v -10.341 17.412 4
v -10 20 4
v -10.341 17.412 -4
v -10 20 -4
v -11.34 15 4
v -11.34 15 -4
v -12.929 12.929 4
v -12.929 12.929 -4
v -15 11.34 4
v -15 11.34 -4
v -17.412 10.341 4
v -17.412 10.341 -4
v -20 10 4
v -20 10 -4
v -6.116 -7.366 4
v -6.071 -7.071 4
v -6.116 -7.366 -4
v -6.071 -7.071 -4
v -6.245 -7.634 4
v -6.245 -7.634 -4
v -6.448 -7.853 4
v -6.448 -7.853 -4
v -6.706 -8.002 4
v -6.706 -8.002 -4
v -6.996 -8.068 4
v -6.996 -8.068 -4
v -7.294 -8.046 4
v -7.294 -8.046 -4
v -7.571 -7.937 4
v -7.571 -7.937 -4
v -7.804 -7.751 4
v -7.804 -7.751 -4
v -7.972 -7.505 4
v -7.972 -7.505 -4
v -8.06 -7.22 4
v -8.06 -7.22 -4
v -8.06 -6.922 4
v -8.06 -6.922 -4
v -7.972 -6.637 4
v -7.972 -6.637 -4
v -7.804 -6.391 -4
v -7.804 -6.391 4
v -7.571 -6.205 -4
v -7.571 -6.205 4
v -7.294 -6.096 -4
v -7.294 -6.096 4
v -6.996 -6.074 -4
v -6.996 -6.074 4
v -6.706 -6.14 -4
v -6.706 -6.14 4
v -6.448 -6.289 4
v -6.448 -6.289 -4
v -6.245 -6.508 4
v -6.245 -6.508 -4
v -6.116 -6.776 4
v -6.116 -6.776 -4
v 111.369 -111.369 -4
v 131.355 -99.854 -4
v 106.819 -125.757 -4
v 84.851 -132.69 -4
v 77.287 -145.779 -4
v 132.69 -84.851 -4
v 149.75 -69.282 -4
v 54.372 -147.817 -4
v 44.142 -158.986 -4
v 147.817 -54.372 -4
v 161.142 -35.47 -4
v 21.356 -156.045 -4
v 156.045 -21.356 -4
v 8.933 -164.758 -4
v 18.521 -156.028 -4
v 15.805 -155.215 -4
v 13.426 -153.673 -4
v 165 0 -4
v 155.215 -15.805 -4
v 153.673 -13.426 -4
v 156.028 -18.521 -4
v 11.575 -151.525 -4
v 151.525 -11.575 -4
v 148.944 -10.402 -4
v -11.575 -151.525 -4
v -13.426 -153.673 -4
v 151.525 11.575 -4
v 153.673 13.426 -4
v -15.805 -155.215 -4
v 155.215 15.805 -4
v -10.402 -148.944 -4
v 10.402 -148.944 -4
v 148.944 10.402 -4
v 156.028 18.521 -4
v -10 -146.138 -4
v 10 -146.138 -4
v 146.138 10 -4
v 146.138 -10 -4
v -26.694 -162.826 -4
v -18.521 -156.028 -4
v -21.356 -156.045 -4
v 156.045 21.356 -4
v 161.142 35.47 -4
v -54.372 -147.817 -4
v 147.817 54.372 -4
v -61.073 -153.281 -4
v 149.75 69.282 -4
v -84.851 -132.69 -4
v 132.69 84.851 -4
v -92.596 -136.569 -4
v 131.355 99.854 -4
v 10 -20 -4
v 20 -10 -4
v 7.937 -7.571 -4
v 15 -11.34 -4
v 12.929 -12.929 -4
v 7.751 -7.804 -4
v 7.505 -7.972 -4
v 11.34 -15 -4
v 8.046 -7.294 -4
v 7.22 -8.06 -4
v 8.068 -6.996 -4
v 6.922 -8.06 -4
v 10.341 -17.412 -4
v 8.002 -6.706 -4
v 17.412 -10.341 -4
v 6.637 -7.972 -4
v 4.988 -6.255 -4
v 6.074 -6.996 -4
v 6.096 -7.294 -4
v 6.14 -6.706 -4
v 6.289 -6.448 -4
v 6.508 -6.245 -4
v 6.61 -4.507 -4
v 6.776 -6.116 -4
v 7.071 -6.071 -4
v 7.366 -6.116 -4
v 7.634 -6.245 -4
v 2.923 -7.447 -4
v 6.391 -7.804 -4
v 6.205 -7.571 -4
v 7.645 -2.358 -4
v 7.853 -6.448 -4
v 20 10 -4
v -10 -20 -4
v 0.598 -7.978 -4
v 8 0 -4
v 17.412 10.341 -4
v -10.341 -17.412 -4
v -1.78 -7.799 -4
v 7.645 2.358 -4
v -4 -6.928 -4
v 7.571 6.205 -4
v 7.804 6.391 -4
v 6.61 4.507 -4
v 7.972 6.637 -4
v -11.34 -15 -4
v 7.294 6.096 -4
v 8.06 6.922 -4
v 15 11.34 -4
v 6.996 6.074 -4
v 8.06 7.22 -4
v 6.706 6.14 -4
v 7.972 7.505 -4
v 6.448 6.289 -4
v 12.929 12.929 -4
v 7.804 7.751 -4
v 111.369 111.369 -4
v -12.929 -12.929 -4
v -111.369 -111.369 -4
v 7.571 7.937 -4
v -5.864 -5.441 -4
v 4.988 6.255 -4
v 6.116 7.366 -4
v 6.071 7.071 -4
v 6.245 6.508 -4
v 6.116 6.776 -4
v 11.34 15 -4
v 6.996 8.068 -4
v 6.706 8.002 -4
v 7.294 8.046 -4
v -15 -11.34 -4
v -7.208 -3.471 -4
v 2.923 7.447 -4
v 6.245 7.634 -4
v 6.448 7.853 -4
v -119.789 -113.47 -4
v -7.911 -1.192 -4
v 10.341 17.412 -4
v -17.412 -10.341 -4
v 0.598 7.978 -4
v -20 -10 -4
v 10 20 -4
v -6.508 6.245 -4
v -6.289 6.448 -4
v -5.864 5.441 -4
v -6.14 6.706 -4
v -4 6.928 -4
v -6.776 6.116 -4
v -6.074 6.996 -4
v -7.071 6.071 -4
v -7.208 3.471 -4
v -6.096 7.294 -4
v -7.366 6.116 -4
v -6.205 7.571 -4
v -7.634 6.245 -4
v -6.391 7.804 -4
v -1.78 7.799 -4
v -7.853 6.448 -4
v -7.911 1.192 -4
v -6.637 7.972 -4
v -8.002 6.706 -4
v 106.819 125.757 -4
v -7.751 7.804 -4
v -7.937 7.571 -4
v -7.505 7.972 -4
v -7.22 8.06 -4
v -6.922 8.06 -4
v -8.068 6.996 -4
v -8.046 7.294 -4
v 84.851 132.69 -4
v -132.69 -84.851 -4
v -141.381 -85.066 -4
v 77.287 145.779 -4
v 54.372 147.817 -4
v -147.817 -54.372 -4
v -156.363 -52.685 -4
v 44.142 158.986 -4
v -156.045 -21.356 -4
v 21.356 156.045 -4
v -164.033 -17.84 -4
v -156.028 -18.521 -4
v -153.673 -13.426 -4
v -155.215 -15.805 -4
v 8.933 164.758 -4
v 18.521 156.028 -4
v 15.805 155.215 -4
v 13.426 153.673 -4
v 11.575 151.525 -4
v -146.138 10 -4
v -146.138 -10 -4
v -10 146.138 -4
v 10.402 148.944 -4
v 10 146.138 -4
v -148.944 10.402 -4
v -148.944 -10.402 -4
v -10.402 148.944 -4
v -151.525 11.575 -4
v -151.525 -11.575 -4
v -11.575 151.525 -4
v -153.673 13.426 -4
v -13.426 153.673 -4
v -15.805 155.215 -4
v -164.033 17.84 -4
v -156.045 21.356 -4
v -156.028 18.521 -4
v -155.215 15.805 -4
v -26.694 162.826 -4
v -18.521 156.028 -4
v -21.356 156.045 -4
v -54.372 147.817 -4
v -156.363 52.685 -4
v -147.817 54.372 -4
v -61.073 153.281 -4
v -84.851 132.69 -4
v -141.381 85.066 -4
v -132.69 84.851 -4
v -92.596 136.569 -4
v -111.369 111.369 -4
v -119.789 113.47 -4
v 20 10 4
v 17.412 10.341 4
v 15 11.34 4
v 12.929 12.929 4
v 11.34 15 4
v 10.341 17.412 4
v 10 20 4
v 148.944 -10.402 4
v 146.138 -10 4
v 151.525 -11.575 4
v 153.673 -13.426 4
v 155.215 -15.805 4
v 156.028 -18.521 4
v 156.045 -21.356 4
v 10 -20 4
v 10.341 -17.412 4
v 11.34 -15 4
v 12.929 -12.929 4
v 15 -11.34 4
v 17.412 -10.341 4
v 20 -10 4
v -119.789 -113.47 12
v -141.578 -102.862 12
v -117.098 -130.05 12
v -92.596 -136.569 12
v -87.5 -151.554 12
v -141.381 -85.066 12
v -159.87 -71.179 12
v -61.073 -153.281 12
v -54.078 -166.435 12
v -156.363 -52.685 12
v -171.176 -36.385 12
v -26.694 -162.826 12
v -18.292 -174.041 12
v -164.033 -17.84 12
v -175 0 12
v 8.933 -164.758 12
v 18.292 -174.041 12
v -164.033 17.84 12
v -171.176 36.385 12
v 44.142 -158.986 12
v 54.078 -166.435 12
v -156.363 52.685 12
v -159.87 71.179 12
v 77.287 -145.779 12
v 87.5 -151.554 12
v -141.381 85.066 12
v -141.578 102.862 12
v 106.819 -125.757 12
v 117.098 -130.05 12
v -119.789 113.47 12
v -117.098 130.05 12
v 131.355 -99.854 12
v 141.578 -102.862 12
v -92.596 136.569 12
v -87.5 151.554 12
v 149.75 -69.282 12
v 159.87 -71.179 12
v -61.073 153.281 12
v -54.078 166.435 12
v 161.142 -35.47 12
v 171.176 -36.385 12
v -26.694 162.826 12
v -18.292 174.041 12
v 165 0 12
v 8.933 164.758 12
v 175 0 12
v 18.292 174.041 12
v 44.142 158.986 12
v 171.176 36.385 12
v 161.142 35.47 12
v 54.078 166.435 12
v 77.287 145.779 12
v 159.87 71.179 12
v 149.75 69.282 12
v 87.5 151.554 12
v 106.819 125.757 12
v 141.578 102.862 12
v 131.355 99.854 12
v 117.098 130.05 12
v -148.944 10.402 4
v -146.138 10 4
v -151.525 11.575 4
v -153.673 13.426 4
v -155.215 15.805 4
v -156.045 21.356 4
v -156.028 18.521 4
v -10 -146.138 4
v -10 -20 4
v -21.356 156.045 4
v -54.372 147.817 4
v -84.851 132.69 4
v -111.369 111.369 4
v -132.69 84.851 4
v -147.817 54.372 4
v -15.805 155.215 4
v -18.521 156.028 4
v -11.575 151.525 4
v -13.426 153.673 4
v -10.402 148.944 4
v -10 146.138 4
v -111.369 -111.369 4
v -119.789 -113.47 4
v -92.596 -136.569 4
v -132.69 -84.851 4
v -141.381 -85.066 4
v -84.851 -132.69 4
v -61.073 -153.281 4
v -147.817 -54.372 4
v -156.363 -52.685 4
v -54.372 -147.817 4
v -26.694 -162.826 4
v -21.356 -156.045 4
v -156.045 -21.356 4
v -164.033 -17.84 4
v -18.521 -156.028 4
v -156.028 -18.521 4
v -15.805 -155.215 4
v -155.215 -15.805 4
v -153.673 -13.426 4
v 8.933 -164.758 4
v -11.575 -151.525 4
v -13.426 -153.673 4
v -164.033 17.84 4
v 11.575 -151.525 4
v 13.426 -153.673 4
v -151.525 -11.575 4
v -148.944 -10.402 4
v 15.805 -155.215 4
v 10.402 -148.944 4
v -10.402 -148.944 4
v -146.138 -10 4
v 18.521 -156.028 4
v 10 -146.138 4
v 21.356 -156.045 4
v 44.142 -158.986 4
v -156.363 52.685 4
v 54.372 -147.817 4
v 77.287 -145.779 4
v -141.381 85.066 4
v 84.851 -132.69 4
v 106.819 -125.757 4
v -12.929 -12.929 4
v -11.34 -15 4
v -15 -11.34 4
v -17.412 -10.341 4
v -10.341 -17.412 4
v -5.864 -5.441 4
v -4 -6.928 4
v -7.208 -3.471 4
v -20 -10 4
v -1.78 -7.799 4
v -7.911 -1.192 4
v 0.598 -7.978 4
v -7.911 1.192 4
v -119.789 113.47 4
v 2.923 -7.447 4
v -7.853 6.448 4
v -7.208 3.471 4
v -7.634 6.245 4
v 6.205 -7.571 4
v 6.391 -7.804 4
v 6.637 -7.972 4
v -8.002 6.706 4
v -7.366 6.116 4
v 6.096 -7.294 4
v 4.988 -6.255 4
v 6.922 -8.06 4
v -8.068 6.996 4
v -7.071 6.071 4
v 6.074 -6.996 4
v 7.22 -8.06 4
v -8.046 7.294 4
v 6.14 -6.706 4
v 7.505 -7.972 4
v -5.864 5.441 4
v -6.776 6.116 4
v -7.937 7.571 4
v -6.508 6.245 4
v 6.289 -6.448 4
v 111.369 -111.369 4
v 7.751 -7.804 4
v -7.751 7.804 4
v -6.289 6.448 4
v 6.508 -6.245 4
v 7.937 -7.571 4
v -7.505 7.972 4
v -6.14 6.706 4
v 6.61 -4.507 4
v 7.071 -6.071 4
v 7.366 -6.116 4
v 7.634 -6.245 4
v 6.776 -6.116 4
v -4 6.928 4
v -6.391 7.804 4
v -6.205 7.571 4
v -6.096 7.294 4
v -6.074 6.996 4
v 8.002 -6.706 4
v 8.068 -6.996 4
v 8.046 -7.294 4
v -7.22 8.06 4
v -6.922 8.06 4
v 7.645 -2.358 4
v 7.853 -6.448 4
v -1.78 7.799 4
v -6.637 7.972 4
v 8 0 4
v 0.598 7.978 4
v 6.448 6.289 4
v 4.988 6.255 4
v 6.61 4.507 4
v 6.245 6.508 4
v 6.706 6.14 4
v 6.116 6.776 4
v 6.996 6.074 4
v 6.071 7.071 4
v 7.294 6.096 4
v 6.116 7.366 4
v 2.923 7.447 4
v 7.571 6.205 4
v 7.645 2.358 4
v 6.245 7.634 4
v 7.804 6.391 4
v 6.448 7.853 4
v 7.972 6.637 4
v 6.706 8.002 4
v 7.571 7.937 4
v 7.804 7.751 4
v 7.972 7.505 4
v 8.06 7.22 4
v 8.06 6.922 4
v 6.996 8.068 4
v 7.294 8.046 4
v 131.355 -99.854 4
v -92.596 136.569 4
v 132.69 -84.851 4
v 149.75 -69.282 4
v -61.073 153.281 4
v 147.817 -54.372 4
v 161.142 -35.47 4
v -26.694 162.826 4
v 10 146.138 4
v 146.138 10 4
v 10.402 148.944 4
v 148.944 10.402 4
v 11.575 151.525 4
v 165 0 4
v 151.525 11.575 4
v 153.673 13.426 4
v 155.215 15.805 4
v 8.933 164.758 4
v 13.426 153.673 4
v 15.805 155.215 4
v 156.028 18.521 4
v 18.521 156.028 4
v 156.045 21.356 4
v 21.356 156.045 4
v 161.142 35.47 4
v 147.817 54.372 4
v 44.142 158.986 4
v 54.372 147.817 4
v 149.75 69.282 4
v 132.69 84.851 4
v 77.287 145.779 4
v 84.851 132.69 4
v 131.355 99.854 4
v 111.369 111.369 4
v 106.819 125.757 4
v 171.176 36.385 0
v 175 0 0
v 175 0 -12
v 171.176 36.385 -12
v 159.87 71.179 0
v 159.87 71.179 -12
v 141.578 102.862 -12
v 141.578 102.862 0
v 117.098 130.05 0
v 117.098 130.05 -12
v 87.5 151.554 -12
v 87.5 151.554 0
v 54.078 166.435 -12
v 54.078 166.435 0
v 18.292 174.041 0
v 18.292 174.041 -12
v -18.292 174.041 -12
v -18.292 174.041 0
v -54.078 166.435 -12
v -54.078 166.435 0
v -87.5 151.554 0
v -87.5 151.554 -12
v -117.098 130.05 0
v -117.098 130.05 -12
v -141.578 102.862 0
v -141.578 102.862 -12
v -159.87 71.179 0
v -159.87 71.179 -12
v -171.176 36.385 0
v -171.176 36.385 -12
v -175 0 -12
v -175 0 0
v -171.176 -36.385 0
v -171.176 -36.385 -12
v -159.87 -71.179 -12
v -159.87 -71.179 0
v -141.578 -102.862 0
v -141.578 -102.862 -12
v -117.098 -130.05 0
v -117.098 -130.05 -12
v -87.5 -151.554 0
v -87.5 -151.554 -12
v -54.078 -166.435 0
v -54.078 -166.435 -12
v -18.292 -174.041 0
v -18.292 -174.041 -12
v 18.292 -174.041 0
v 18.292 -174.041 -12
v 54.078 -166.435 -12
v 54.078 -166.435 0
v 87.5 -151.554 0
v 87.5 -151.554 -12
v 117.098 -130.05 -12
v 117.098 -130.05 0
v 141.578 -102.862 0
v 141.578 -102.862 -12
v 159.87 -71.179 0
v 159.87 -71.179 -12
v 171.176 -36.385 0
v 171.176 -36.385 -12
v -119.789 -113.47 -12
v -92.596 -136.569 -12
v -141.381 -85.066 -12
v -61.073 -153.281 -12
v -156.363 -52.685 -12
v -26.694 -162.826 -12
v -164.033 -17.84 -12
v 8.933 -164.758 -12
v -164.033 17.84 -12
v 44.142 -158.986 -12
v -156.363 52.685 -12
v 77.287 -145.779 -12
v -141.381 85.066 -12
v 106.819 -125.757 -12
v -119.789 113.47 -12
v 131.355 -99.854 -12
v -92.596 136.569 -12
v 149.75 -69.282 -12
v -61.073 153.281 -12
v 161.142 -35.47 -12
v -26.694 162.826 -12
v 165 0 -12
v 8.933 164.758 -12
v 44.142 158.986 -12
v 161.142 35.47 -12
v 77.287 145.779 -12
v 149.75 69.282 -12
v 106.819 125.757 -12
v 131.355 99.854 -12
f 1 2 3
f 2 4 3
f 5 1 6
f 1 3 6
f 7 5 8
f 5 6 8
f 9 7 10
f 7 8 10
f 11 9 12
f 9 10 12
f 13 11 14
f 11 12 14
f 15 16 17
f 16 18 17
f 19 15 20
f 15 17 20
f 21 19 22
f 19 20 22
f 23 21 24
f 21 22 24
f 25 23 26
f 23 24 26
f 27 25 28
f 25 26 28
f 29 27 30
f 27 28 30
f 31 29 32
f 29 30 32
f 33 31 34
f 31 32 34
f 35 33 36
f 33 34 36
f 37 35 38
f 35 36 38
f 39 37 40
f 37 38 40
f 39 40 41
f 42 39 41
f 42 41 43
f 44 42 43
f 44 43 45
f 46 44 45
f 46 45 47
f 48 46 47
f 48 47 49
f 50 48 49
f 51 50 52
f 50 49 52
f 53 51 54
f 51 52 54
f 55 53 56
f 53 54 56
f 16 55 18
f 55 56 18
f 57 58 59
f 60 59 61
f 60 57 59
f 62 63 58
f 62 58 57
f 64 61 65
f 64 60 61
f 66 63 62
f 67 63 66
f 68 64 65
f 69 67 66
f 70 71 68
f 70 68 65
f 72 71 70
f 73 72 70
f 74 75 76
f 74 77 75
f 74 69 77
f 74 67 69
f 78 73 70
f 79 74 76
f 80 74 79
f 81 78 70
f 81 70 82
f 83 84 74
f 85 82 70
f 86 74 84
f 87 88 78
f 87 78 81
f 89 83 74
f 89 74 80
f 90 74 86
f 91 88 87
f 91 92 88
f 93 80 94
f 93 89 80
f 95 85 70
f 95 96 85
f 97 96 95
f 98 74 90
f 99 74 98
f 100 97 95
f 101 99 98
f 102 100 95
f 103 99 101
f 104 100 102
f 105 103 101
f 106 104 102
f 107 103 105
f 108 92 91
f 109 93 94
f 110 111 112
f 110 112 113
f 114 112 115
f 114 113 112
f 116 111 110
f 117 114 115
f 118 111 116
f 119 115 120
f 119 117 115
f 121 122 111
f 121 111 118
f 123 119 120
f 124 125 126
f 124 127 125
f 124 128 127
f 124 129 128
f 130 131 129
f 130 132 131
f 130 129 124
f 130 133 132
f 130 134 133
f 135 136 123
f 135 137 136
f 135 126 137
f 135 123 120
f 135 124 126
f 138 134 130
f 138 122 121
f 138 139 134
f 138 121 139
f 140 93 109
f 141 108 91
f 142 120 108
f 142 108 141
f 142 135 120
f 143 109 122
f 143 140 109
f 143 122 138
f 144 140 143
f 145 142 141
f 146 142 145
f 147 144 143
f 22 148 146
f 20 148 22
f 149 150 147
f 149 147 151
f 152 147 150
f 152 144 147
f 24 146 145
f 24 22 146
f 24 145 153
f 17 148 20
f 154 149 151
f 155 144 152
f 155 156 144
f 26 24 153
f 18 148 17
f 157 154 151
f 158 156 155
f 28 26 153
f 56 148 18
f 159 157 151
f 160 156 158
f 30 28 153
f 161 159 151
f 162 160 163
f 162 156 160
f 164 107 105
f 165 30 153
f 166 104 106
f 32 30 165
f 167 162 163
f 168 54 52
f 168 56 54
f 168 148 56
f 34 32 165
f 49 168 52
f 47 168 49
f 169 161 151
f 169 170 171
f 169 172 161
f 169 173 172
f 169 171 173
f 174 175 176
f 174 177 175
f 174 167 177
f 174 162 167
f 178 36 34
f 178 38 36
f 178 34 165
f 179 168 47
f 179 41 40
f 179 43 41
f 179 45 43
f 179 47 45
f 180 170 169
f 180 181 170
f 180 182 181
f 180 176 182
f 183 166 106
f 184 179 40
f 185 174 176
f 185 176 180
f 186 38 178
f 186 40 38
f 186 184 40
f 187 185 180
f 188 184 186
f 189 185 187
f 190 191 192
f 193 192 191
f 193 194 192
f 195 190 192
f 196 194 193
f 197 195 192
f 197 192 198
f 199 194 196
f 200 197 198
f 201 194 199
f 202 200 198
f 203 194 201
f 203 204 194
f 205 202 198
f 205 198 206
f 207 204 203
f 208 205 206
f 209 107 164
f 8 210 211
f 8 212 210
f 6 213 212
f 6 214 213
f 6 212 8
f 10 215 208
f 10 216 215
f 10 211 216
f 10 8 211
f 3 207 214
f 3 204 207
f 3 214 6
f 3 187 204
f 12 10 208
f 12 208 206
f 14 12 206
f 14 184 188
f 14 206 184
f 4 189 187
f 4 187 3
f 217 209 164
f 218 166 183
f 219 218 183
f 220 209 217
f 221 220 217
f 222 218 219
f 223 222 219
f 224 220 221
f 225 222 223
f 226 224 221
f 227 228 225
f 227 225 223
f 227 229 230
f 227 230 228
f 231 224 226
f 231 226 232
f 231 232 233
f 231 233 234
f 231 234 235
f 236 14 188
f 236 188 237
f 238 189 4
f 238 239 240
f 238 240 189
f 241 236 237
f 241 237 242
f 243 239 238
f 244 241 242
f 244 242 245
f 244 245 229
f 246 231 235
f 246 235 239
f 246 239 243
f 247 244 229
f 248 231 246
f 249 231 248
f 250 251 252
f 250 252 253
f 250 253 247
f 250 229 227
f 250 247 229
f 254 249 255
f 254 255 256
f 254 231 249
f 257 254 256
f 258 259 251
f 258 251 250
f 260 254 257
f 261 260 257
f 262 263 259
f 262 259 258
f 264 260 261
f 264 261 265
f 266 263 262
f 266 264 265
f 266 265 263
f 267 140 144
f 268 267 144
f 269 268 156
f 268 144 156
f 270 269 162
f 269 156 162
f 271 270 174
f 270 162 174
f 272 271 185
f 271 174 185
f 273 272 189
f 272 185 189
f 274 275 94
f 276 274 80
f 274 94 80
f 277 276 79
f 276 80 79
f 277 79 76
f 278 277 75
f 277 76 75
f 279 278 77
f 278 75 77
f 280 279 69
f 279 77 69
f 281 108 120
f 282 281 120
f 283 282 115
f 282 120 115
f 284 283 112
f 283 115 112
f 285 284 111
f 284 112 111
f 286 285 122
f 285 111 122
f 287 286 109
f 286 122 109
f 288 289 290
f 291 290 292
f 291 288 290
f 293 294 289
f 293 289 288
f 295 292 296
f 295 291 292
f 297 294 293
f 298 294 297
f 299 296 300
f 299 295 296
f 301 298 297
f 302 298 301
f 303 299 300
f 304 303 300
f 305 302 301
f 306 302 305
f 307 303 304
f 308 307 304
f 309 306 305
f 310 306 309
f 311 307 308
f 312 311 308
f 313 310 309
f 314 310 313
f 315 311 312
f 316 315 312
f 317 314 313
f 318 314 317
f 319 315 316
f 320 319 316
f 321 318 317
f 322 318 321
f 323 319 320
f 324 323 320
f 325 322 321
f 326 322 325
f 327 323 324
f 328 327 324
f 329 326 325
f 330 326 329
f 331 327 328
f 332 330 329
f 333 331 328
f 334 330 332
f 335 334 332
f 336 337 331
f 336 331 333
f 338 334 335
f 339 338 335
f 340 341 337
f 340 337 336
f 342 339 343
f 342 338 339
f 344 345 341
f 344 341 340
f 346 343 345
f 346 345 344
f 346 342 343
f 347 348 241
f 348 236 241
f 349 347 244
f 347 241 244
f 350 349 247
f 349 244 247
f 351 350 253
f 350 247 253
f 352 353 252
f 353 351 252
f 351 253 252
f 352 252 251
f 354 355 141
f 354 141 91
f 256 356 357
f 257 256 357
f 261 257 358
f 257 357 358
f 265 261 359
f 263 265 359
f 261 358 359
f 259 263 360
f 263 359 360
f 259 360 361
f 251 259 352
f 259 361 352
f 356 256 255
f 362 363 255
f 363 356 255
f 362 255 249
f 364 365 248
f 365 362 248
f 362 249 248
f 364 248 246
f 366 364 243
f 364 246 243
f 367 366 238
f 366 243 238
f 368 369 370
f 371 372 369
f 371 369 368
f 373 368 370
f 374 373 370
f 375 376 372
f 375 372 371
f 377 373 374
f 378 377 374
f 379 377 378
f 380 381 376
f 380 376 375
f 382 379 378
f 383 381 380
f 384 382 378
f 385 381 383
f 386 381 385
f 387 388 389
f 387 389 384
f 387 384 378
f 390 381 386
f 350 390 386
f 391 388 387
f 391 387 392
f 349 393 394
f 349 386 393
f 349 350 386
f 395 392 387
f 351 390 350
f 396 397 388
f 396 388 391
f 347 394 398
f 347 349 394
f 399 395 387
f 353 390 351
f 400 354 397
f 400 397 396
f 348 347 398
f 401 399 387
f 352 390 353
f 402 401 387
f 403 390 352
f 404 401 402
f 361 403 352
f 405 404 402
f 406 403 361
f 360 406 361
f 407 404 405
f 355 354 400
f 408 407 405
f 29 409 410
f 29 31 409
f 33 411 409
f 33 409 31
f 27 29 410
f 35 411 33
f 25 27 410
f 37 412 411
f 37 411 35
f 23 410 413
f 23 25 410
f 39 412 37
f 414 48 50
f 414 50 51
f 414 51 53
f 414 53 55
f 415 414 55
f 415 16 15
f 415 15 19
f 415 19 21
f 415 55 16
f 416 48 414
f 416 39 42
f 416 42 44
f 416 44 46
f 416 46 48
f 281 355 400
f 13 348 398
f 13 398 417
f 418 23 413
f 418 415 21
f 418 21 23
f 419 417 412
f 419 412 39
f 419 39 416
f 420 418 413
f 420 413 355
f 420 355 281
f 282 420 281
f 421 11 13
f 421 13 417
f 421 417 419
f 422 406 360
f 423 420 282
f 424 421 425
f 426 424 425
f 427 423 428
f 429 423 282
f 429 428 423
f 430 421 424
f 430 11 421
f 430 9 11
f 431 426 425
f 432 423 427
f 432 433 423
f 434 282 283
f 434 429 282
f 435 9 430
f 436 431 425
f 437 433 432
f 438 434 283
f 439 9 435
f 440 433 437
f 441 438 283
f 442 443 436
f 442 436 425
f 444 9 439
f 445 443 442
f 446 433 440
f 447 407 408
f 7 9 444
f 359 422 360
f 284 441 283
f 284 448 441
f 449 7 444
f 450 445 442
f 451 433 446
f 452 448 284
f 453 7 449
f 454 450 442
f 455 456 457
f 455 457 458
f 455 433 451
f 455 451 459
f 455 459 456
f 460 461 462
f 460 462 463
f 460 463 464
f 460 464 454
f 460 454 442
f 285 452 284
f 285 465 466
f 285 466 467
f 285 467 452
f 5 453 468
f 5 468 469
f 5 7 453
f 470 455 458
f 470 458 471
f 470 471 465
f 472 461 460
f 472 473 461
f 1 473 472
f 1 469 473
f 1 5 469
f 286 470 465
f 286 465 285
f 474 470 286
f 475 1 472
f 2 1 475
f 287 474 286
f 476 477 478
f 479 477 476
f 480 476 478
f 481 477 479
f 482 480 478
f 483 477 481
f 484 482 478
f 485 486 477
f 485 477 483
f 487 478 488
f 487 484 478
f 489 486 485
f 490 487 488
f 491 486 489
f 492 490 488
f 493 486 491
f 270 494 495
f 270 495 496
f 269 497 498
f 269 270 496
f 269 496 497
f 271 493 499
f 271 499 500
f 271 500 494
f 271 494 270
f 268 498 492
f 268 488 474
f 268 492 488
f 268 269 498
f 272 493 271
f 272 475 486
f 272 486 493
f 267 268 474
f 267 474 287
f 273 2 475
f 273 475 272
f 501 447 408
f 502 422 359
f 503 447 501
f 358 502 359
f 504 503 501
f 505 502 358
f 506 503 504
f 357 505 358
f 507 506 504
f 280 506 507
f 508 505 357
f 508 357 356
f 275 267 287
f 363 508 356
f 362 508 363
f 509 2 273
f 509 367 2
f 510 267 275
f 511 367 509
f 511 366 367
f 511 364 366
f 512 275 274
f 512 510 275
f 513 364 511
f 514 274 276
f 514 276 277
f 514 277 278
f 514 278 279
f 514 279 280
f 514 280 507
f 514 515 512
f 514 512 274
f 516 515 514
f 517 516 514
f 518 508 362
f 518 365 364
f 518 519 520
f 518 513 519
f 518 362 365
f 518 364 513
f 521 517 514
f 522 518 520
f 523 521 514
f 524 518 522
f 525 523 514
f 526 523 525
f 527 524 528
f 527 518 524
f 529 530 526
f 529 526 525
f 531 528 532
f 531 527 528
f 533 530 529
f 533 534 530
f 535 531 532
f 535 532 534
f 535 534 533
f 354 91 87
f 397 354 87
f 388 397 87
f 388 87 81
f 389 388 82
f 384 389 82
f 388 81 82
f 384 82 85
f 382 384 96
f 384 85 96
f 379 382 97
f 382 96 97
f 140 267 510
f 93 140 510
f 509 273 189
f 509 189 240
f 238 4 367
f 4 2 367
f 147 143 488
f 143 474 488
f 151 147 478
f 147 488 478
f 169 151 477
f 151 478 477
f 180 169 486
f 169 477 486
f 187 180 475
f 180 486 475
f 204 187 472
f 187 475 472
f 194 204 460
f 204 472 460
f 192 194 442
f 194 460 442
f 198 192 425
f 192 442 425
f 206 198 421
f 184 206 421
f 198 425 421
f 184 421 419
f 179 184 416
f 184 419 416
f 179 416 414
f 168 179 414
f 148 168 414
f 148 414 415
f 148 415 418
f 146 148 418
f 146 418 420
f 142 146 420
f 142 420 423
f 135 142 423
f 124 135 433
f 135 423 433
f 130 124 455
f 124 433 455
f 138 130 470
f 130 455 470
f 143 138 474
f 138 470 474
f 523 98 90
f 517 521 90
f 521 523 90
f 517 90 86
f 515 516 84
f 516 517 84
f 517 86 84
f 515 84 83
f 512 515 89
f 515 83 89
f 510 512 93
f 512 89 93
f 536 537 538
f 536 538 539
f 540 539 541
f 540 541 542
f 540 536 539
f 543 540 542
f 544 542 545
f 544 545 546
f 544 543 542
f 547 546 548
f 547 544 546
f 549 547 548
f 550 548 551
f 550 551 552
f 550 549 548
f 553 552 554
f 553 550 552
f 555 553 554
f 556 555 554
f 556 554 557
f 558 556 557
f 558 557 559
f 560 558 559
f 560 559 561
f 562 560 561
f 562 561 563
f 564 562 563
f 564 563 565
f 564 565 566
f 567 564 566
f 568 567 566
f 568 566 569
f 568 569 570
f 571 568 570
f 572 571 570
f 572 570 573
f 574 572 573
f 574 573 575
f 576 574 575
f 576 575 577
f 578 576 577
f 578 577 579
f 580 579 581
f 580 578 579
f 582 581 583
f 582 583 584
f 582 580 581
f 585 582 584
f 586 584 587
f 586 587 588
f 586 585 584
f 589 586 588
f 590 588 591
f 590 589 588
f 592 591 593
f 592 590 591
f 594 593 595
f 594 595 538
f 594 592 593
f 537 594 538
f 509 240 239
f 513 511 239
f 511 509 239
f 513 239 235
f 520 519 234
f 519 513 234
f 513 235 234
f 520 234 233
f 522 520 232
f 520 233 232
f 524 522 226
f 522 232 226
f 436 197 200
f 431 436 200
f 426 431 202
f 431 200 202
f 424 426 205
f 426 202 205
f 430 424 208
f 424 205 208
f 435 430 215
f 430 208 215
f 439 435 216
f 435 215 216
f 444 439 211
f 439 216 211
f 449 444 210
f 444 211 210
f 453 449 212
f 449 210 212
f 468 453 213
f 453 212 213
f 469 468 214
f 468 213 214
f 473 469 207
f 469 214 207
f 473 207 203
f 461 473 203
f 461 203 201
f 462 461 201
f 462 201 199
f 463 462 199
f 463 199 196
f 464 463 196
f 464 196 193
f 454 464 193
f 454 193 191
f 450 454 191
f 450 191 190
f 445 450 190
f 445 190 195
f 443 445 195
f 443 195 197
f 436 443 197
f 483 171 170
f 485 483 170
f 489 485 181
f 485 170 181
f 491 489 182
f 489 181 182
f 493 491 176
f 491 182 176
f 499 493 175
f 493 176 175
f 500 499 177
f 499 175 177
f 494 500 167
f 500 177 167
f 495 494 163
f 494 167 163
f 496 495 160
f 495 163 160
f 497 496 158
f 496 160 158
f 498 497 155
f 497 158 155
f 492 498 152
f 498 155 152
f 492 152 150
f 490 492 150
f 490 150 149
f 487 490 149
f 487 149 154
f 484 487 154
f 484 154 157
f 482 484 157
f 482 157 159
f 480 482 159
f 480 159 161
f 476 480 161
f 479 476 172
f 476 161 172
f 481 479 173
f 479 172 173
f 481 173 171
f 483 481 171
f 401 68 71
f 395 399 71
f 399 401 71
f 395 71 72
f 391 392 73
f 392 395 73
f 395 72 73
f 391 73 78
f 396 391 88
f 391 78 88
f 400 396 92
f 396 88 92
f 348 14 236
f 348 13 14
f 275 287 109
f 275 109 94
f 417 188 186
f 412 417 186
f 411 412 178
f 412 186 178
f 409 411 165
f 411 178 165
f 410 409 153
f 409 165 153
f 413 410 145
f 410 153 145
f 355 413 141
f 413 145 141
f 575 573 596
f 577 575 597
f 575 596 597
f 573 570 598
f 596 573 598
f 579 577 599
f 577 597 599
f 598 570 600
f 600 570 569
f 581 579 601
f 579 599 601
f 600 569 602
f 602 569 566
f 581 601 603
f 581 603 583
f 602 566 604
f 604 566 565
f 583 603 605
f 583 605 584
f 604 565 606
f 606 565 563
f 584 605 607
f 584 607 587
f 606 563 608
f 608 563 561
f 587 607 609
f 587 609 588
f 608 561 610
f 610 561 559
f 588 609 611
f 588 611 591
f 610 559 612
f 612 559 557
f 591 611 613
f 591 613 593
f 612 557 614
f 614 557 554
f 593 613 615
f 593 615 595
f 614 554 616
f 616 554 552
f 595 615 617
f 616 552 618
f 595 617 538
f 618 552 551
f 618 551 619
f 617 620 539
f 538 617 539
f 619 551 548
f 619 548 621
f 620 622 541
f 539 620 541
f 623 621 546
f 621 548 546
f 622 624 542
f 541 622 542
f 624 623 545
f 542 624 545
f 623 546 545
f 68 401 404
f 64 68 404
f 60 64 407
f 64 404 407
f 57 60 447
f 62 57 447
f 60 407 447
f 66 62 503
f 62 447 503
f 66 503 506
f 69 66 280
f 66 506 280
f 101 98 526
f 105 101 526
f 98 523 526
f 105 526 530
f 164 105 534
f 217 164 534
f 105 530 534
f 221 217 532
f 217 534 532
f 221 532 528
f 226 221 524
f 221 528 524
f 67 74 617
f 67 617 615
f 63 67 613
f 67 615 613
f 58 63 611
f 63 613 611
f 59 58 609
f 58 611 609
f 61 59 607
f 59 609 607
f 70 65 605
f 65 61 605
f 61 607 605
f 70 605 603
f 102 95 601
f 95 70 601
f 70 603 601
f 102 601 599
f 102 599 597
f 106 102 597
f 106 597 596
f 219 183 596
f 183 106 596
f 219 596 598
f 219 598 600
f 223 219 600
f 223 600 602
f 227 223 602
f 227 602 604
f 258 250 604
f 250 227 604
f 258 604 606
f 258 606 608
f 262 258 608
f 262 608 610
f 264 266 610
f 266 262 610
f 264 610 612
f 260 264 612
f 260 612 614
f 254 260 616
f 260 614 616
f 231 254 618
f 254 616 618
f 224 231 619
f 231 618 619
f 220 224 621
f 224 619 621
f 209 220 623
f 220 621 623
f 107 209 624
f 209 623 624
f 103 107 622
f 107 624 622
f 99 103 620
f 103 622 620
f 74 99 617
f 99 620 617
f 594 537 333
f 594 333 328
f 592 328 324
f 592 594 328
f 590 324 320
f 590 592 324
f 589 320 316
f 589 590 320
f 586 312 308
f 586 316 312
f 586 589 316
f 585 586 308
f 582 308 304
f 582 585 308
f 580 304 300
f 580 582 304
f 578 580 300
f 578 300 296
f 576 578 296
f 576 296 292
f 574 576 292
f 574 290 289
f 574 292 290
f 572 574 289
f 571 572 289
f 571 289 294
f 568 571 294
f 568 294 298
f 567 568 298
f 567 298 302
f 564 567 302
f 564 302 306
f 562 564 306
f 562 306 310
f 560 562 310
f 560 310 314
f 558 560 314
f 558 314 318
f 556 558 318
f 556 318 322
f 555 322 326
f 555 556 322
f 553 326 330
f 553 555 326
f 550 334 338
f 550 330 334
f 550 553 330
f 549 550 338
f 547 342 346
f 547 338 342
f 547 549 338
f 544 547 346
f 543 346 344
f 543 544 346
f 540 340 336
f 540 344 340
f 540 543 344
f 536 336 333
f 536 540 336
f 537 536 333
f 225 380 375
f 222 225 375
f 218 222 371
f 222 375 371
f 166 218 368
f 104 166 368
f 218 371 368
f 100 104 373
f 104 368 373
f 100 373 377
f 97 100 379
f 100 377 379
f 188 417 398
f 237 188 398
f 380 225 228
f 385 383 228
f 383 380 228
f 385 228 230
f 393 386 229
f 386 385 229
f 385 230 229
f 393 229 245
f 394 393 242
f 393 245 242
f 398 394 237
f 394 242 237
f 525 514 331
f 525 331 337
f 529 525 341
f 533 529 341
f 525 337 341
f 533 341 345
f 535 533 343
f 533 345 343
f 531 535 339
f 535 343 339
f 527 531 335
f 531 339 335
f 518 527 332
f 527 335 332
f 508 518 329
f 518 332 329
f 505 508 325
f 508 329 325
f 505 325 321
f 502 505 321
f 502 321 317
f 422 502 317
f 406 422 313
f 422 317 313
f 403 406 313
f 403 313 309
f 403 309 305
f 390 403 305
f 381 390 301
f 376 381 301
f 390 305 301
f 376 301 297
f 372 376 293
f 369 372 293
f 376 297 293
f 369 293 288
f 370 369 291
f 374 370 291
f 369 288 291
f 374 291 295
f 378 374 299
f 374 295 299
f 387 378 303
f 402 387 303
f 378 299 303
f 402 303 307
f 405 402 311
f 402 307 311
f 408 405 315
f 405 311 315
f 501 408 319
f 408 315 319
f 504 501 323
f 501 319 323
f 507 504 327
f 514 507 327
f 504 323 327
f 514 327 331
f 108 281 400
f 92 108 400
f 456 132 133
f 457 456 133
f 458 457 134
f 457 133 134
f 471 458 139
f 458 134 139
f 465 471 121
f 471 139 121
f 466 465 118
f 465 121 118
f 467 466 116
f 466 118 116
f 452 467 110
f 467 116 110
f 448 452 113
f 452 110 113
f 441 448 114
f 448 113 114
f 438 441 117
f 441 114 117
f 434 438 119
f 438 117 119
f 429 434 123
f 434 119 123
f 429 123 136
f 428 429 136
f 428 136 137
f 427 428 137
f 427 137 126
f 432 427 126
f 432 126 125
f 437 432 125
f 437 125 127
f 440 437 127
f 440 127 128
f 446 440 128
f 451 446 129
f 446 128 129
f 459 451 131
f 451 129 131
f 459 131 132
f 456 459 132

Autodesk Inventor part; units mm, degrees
ref_plane "YZ Plane" through (0, 0, 0) normal (1, 0, 0) x (0, 1, 0)
ref_plane "XZ Plane" through (0, 0, 0) normal (0, 1, 0) x (-1, 0, 0)
sketch "Sketch1" plane through (0, 0, 0) normal (0, 0, 1) x (1, 0, 0)
  circle A0 centre (0, 0) radius 175
  dimension "d0" = 350
extrude "Extrusion1" add sketch "Sketch1" along normal mid plane 24
sketch "Sketch2" plane through (0, 0, 12) normal (0, 0, 1) x (1, 0, 0)
  circle A0 centre (0, 0) radius 165
  dimension "d3" = 330
extrude "Extrusion2" cut sketch "Sketch2" against normal blind 8
ref_plane "Work Plane1" through (0, 0, 0) normal (0, 0, 1) x (1, 0, 0)
mirror "Mirror1" about plane through (0, 0, 0) normal (0, 0, 1) of "Extrusion2"
sketch "Sketch3" plane through (0, 0, 4) normal (0, 0, 1) x (1, 0, 0)
  circle A0 centre (0, 0) radius 8
  line L0 (-10, -10) -> (-10, -157.1822)
  line L1 (10, -10) -> (10, -157.1822)
  line L2 (0, 0) -> (0, -162.7163) construction
  arc A1 (-157.1822, -10) -> (-10, -157.1822) centre (0, 0) ccw
  line L3 (-10, -10) -> (-157.1822, -10)
  arc A2 (10, -157.1822) -> (157.1822, -10) centre (0, 0) ccw
  line L4 (10, -10) -> (157.1822, -10)
  dimension "d7" = 16
  dimension "d8" = 20
  dimension "d9" = 157.5
  dimension "d10" = 10
extrude "Extrusion3" cut sketch "Sketch3" against normal blind 8 contours L0 A1 L3 | L4 A2 L1
pattern_circular "Circular Pattern1" count 2 over 360 about axis through (0, 0, 12) along (0, 0, -1) of "Extrusion3"
fillet "Fillet1" radius 10 12 edges at (-10, 157.1822, 0) (-157.1822, 10, 0) (-10, 10, 0) (-10, -10, 0) (-157.1822, -10, 0) (-10, -157.1822, 0) (10, -157.1822, 0) (10, -10, 0) (157.1822, -10, 0) (157.1822, 10, 0) (10, 10, 0) (10, 157.1822, 0)
extrude "Extrusion4" cut sketch "Sketch3" against normal up to surface (8 mm away) contours A0
sketch "Sketch4" plane through (0, 0, 4) normal (0, 0, 1) x (1, 0, 0)
  circle A0 centre (0, 0) radius 8 projected
  circle A1 centre (0, 0) radius 10 construction
  line L0 (0, 0) -> (-7.0711, 7.0711) construction
  line L1 (0, 0) -> (0, 20.2635) construction
  dimension "d21" = 20
  dimension "d22" = 45
hole "Hole1" at (-7.0711, 7.0711, 4) direction (0, 0, -1) diameter 2 depth 8
pattern_circular "Circular Pattern2" count 4 over 360 about axis through (0, 0, 4) along (0, 0, -1) of "Hole1"
properties part number "05"
